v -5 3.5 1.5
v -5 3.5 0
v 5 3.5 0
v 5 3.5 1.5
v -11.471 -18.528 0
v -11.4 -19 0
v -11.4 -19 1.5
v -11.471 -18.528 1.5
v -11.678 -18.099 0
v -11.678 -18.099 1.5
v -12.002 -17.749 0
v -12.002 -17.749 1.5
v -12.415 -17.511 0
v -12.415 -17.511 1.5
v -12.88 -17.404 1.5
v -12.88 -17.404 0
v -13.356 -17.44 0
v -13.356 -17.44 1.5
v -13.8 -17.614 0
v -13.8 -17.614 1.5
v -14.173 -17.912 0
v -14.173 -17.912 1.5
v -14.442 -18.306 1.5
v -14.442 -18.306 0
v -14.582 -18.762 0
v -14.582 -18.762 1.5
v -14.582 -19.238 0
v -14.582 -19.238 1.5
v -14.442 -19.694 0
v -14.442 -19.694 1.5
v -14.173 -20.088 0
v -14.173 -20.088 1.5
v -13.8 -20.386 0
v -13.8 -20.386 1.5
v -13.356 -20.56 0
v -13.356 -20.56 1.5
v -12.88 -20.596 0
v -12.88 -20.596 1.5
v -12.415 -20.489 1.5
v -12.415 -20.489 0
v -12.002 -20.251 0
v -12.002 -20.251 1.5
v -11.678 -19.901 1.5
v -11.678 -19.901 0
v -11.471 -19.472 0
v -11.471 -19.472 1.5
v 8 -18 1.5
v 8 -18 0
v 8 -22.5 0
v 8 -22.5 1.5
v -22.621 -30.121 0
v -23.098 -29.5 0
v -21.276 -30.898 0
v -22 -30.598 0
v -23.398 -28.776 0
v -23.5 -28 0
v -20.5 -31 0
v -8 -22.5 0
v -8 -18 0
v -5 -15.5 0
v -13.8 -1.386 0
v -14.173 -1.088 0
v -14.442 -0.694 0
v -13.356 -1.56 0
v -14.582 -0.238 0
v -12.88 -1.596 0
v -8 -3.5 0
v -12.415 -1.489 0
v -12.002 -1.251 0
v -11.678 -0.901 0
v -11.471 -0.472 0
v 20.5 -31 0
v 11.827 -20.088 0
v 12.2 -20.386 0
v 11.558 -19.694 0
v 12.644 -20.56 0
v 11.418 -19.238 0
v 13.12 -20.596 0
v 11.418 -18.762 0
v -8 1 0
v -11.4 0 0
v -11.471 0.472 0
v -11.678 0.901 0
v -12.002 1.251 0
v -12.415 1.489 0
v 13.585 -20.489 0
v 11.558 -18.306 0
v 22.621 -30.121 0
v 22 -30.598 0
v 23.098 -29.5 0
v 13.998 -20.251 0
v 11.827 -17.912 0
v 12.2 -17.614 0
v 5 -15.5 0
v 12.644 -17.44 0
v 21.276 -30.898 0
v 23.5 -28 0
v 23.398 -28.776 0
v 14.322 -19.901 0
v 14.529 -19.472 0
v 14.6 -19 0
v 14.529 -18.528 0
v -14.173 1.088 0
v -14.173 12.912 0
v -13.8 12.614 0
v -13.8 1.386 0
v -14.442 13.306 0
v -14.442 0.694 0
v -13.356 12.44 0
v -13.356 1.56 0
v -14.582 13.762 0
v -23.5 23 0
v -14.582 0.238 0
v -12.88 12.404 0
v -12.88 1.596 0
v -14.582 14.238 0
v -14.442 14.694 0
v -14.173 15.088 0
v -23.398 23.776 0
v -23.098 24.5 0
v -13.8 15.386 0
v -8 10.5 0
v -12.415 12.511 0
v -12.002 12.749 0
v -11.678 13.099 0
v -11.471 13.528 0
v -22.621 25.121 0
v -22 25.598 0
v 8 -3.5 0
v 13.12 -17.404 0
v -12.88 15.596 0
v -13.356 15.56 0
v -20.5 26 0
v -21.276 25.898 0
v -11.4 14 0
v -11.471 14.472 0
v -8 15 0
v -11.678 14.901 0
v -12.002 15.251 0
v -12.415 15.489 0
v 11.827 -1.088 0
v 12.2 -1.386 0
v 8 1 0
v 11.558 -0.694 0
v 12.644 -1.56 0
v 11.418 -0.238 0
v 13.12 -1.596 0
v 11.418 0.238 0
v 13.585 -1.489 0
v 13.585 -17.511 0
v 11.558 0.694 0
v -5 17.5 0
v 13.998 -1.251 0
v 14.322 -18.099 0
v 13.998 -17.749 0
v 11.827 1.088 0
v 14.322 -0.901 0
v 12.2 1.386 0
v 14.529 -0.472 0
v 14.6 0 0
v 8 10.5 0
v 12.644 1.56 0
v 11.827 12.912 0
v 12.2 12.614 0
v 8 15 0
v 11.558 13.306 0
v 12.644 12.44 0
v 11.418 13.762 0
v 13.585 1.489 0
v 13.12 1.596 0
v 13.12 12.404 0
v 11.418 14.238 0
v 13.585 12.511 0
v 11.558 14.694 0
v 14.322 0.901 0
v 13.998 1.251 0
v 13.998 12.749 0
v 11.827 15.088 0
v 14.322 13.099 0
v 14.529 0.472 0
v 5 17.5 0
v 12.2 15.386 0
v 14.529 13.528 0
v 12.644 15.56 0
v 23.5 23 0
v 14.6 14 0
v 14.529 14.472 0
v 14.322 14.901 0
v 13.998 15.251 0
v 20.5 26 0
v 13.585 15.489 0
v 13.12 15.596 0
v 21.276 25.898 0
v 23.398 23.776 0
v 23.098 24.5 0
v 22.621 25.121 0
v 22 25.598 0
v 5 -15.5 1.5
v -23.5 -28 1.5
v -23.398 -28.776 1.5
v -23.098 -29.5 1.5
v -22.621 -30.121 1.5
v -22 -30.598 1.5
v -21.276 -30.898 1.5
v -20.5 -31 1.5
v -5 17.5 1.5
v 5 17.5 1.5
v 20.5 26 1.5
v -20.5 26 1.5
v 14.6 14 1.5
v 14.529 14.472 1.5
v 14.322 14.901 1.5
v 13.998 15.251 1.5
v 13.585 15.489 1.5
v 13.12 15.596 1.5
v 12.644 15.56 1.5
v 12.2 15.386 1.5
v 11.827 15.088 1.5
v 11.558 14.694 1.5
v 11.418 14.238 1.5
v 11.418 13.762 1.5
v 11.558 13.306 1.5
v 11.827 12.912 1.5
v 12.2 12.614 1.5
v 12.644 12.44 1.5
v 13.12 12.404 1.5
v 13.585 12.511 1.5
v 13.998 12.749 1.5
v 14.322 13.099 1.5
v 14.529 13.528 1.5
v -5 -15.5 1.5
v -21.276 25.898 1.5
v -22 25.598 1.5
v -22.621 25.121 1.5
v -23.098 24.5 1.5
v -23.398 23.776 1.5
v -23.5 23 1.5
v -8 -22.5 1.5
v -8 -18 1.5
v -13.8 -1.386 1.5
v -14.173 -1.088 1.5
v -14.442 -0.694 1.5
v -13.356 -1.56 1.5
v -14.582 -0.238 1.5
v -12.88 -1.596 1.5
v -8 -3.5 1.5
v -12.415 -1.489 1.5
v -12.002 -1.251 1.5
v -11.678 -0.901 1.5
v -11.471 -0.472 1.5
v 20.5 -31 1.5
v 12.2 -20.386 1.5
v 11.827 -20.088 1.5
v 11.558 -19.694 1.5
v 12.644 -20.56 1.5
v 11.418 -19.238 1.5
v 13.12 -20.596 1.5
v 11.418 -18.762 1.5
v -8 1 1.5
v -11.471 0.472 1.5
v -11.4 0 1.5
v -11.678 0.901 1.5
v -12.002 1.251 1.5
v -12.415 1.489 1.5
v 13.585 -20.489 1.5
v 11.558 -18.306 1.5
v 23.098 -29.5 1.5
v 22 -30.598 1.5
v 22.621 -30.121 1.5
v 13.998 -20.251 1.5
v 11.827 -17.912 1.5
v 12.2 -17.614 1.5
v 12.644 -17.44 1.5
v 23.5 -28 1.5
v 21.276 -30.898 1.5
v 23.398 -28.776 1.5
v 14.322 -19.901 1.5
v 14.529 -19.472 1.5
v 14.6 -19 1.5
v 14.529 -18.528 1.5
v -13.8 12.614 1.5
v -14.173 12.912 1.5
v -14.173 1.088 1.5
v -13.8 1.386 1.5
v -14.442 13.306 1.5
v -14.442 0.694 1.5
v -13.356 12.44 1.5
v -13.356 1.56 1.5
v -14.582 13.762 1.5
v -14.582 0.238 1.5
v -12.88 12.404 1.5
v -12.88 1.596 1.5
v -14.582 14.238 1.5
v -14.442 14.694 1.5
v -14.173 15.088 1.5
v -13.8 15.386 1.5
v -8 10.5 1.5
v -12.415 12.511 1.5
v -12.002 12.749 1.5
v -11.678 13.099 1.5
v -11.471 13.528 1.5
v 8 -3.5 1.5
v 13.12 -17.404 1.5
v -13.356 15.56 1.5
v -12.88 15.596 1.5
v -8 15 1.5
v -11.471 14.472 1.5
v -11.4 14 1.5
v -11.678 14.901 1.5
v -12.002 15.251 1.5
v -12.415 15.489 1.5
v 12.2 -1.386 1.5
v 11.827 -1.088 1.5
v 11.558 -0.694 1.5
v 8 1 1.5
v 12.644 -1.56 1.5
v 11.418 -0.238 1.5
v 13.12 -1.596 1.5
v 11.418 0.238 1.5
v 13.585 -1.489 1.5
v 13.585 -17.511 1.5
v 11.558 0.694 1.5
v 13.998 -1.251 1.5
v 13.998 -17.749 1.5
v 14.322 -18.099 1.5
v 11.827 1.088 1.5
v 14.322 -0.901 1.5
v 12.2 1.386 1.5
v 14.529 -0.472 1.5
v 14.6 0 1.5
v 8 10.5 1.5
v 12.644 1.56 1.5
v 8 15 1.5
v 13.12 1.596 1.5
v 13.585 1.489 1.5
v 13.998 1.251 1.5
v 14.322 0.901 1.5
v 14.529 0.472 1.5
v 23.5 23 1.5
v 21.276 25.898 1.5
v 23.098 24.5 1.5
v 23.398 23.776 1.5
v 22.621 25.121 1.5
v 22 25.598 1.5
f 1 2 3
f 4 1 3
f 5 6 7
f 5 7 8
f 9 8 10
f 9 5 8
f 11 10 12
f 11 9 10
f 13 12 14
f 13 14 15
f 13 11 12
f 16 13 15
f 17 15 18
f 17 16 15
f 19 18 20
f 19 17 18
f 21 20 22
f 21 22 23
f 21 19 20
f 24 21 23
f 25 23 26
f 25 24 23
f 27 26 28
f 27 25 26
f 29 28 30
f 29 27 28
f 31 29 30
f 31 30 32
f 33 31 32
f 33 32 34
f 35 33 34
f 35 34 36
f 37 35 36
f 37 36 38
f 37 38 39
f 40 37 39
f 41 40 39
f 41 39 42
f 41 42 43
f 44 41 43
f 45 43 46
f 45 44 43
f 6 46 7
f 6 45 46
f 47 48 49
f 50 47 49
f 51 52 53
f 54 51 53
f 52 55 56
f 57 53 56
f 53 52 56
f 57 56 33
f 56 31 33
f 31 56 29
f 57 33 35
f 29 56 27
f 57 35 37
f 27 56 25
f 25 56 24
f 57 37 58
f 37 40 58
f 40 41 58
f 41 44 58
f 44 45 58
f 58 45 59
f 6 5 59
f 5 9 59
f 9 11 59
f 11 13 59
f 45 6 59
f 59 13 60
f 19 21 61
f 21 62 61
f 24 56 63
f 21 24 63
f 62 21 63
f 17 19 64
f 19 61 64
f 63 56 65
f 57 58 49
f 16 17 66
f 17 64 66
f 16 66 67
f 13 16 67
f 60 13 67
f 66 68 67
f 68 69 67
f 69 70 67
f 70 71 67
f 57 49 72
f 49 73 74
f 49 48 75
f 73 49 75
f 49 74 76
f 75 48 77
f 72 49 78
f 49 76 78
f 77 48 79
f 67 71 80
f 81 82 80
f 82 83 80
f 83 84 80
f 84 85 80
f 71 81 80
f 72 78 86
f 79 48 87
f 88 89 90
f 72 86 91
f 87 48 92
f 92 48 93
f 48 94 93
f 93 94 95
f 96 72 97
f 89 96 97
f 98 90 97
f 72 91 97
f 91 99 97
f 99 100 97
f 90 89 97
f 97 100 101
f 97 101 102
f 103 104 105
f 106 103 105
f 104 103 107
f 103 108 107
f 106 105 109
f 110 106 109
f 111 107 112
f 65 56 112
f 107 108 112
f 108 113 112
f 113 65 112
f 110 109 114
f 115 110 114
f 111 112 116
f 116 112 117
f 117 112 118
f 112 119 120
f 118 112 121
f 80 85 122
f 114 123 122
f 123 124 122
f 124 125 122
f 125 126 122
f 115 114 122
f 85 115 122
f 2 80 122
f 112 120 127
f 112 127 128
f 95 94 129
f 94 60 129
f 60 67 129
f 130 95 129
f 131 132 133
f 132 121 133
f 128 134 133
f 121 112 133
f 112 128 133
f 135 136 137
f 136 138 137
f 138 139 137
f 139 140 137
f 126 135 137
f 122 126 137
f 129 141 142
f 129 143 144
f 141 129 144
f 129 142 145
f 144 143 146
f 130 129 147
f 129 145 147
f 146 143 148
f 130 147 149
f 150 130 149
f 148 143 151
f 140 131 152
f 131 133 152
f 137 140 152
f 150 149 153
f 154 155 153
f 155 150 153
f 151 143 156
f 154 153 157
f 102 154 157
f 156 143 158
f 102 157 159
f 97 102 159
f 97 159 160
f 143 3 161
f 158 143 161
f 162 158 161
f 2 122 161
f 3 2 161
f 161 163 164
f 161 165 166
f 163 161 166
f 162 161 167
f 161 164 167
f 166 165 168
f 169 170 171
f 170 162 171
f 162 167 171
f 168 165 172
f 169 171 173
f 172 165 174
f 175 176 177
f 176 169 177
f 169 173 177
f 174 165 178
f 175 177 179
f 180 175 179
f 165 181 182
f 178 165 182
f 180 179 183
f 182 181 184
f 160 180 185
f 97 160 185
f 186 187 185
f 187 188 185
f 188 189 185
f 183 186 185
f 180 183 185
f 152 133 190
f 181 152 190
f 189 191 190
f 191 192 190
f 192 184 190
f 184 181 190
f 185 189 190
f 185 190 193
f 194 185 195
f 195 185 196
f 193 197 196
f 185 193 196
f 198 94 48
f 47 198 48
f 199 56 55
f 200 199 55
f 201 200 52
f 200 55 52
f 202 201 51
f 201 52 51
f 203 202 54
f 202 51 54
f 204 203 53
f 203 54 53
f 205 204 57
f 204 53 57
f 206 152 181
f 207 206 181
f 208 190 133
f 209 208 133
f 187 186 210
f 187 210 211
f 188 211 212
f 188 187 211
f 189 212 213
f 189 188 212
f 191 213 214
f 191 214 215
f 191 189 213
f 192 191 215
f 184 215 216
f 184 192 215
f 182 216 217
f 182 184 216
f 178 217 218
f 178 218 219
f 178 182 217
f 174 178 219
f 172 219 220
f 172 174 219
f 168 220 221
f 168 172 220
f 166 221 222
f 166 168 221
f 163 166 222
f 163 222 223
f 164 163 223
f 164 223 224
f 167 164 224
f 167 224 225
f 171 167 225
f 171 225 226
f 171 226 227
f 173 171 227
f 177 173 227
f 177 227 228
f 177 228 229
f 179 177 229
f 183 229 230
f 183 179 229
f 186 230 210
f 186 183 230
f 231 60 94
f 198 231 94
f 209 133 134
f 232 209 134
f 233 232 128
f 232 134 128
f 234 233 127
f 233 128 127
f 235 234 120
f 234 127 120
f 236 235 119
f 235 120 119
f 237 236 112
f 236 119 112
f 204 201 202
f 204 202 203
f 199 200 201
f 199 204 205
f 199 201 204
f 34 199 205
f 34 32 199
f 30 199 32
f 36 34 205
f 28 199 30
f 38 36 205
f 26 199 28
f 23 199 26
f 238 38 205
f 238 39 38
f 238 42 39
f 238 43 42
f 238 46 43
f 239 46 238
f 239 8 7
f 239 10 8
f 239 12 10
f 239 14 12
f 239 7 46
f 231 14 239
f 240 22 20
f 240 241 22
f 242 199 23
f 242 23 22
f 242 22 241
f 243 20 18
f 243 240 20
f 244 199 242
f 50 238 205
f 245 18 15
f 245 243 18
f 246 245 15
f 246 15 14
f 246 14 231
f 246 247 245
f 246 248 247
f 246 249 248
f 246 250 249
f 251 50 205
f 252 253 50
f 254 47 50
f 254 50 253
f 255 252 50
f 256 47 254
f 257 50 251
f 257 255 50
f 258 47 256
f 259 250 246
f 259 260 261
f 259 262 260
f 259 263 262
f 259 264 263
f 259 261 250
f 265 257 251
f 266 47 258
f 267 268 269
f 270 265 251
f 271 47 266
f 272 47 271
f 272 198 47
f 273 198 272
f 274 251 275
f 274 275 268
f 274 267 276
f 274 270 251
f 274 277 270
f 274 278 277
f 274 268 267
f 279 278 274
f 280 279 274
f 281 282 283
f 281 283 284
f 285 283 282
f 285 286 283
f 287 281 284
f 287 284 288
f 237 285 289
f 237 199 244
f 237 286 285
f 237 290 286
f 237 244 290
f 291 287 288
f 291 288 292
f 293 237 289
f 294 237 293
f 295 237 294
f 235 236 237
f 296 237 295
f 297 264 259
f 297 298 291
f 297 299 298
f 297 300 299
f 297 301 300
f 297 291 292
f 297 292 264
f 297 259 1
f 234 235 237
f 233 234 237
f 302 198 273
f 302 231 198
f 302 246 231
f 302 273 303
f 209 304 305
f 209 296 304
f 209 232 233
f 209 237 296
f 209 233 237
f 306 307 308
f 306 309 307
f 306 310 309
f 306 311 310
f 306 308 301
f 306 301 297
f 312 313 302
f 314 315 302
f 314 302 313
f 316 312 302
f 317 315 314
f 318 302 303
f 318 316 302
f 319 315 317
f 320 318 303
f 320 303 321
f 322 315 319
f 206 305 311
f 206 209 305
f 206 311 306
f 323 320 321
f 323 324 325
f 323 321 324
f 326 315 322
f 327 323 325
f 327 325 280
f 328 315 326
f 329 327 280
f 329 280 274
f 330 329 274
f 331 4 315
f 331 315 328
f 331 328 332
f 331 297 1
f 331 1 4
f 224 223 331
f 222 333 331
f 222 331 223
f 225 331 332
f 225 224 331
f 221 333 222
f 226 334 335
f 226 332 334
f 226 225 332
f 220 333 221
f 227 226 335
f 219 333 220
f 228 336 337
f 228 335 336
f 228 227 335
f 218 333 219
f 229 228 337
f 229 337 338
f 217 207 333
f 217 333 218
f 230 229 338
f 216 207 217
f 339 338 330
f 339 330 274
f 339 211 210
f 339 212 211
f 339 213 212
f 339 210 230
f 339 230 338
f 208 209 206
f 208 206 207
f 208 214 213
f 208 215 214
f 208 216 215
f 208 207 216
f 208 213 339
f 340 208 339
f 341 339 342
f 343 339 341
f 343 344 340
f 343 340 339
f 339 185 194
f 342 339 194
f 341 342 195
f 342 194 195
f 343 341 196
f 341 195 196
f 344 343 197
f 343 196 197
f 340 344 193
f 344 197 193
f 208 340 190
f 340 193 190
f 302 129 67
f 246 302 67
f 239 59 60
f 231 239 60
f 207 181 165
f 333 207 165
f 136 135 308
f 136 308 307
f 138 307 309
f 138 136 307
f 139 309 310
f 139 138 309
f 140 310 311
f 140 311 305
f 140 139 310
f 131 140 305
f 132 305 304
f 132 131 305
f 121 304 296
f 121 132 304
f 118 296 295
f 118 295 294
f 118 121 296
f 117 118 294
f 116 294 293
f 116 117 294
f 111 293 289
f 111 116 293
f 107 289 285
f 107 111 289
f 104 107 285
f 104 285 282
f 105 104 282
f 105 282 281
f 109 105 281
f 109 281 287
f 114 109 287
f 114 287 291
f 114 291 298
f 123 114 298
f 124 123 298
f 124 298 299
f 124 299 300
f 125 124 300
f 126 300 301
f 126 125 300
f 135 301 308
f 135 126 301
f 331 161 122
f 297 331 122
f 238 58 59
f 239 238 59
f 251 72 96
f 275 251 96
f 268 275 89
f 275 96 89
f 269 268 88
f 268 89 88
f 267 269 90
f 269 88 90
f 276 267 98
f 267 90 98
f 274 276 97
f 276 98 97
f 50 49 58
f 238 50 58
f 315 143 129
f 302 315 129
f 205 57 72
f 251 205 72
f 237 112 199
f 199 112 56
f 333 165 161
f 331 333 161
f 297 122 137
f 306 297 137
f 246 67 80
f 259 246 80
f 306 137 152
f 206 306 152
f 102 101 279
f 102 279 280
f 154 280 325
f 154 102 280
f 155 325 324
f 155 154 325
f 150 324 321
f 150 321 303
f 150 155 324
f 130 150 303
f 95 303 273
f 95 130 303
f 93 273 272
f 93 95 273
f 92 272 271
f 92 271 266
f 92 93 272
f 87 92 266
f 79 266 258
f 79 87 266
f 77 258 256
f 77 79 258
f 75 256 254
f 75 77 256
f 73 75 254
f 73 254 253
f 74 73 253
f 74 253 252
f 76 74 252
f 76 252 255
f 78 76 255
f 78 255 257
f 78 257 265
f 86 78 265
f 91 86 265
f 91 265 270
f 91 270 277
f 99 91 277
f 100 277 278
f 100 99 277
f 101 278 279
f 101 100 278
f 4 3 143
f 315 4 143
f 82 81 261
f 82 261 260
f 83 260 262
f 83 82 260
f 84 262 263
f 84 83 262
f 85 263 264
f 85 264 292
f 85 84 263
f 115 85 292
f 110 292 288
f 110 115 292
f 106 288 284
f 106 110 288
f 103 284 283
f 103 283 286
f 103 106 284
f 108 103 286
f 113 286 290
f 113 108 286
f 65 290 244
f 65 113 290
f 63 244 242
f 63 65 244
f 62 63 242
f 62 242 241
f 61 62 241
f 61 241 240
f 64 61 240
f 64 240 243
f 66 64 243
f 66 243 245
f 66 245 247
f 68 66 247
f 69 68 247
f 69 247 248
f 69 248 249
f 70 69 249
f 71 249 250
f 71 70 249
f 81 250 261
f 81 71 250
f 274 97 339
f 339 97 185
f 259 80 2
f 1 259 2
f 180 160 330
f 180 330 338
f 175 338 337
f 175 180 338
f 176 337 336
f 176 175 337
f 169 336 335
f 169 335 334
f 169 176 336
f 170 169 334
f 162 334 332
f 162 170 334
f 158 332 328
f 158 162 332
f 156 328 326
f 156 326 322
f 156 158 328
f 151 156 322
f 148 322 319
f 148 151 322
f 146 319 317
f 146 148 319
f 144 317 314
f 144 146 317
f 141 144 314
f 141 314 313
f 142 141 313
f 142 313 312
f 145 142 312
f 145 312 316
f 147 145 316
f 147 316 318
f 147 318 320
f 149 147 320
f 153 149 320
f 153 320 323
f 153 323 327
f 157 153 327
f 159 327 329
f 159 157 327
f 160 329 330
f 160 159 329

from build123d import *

# Parameters (mm, degrees)
F0_R     = 1.6
F1_DEPTH = 1.5


with BuildPart() as f1:
    # F0 (on Top) → F1 (new body)
    with BuildSketch(Plane.XY):
        with BuildLine():
            Line((-20.5, -31), (20.5, -31))
            ThreePointArc((20.5, -31), (22.62132, -30.12132), (23.5, -28))
            Line((23.5, -28), (23.5, 23))
            ThreePointArc((23.5, 23), (22.62132, 25.12132), (20.5, 26))
            Line((20.5, 26), (-20.5, 26))
            ThreePointArc((-20.5, 26), (-22.62132, 25.12132), (-23.5, 23))
            Line((-23.5, 23), (-23.5, -28))
            ThreePointArc((-23.5, -28), (-22.62132, -30.12132), (-20.5, -31))
        make_face()
        with Locations((-13, -19)):
            Circle(F0_R, mode=Mode.SUBTRACT)
        Polygon((-8, -18), (-5, -15.5), (5, -15.5), (8, -18), (8, -22.5), (-8, -22.5), align=None, mode=Mode.SUBTRACT)
        with Locations((13, -19)):
            Circle(F0_R, mode=Mode.SUBTRACT)
        with Locations((-13, 0)):
            Circle(F0_R, mode=Mode.SUBTRACT)
        with Locations((-13, 14)):
            Circle(F0_R, mode=Mode.SUBTRACT)
        Polygon((-8, 1), (-5, 3.5), (5, 3.5), (8, 1), (8, -3.5), (-8, -3.5), align=None, mode=Mode.SUBTRACT)
        with Locations((13, 0)):
            Circle(F0_R, mode=Mode.SUBTRACT)
        Polygon((-8, 15), (-5, 17.5), (5, 17.5), (8, 15), (8, 10.5), (-8, 10.5), align=None, mode=Mode.SUBTRACT)
        with Locations((13, 14)):
            Circle(F0_R, mode=Mode.SUBTRACT)
    extrude(amount=F1_DEPTH)


solid = f1.part
